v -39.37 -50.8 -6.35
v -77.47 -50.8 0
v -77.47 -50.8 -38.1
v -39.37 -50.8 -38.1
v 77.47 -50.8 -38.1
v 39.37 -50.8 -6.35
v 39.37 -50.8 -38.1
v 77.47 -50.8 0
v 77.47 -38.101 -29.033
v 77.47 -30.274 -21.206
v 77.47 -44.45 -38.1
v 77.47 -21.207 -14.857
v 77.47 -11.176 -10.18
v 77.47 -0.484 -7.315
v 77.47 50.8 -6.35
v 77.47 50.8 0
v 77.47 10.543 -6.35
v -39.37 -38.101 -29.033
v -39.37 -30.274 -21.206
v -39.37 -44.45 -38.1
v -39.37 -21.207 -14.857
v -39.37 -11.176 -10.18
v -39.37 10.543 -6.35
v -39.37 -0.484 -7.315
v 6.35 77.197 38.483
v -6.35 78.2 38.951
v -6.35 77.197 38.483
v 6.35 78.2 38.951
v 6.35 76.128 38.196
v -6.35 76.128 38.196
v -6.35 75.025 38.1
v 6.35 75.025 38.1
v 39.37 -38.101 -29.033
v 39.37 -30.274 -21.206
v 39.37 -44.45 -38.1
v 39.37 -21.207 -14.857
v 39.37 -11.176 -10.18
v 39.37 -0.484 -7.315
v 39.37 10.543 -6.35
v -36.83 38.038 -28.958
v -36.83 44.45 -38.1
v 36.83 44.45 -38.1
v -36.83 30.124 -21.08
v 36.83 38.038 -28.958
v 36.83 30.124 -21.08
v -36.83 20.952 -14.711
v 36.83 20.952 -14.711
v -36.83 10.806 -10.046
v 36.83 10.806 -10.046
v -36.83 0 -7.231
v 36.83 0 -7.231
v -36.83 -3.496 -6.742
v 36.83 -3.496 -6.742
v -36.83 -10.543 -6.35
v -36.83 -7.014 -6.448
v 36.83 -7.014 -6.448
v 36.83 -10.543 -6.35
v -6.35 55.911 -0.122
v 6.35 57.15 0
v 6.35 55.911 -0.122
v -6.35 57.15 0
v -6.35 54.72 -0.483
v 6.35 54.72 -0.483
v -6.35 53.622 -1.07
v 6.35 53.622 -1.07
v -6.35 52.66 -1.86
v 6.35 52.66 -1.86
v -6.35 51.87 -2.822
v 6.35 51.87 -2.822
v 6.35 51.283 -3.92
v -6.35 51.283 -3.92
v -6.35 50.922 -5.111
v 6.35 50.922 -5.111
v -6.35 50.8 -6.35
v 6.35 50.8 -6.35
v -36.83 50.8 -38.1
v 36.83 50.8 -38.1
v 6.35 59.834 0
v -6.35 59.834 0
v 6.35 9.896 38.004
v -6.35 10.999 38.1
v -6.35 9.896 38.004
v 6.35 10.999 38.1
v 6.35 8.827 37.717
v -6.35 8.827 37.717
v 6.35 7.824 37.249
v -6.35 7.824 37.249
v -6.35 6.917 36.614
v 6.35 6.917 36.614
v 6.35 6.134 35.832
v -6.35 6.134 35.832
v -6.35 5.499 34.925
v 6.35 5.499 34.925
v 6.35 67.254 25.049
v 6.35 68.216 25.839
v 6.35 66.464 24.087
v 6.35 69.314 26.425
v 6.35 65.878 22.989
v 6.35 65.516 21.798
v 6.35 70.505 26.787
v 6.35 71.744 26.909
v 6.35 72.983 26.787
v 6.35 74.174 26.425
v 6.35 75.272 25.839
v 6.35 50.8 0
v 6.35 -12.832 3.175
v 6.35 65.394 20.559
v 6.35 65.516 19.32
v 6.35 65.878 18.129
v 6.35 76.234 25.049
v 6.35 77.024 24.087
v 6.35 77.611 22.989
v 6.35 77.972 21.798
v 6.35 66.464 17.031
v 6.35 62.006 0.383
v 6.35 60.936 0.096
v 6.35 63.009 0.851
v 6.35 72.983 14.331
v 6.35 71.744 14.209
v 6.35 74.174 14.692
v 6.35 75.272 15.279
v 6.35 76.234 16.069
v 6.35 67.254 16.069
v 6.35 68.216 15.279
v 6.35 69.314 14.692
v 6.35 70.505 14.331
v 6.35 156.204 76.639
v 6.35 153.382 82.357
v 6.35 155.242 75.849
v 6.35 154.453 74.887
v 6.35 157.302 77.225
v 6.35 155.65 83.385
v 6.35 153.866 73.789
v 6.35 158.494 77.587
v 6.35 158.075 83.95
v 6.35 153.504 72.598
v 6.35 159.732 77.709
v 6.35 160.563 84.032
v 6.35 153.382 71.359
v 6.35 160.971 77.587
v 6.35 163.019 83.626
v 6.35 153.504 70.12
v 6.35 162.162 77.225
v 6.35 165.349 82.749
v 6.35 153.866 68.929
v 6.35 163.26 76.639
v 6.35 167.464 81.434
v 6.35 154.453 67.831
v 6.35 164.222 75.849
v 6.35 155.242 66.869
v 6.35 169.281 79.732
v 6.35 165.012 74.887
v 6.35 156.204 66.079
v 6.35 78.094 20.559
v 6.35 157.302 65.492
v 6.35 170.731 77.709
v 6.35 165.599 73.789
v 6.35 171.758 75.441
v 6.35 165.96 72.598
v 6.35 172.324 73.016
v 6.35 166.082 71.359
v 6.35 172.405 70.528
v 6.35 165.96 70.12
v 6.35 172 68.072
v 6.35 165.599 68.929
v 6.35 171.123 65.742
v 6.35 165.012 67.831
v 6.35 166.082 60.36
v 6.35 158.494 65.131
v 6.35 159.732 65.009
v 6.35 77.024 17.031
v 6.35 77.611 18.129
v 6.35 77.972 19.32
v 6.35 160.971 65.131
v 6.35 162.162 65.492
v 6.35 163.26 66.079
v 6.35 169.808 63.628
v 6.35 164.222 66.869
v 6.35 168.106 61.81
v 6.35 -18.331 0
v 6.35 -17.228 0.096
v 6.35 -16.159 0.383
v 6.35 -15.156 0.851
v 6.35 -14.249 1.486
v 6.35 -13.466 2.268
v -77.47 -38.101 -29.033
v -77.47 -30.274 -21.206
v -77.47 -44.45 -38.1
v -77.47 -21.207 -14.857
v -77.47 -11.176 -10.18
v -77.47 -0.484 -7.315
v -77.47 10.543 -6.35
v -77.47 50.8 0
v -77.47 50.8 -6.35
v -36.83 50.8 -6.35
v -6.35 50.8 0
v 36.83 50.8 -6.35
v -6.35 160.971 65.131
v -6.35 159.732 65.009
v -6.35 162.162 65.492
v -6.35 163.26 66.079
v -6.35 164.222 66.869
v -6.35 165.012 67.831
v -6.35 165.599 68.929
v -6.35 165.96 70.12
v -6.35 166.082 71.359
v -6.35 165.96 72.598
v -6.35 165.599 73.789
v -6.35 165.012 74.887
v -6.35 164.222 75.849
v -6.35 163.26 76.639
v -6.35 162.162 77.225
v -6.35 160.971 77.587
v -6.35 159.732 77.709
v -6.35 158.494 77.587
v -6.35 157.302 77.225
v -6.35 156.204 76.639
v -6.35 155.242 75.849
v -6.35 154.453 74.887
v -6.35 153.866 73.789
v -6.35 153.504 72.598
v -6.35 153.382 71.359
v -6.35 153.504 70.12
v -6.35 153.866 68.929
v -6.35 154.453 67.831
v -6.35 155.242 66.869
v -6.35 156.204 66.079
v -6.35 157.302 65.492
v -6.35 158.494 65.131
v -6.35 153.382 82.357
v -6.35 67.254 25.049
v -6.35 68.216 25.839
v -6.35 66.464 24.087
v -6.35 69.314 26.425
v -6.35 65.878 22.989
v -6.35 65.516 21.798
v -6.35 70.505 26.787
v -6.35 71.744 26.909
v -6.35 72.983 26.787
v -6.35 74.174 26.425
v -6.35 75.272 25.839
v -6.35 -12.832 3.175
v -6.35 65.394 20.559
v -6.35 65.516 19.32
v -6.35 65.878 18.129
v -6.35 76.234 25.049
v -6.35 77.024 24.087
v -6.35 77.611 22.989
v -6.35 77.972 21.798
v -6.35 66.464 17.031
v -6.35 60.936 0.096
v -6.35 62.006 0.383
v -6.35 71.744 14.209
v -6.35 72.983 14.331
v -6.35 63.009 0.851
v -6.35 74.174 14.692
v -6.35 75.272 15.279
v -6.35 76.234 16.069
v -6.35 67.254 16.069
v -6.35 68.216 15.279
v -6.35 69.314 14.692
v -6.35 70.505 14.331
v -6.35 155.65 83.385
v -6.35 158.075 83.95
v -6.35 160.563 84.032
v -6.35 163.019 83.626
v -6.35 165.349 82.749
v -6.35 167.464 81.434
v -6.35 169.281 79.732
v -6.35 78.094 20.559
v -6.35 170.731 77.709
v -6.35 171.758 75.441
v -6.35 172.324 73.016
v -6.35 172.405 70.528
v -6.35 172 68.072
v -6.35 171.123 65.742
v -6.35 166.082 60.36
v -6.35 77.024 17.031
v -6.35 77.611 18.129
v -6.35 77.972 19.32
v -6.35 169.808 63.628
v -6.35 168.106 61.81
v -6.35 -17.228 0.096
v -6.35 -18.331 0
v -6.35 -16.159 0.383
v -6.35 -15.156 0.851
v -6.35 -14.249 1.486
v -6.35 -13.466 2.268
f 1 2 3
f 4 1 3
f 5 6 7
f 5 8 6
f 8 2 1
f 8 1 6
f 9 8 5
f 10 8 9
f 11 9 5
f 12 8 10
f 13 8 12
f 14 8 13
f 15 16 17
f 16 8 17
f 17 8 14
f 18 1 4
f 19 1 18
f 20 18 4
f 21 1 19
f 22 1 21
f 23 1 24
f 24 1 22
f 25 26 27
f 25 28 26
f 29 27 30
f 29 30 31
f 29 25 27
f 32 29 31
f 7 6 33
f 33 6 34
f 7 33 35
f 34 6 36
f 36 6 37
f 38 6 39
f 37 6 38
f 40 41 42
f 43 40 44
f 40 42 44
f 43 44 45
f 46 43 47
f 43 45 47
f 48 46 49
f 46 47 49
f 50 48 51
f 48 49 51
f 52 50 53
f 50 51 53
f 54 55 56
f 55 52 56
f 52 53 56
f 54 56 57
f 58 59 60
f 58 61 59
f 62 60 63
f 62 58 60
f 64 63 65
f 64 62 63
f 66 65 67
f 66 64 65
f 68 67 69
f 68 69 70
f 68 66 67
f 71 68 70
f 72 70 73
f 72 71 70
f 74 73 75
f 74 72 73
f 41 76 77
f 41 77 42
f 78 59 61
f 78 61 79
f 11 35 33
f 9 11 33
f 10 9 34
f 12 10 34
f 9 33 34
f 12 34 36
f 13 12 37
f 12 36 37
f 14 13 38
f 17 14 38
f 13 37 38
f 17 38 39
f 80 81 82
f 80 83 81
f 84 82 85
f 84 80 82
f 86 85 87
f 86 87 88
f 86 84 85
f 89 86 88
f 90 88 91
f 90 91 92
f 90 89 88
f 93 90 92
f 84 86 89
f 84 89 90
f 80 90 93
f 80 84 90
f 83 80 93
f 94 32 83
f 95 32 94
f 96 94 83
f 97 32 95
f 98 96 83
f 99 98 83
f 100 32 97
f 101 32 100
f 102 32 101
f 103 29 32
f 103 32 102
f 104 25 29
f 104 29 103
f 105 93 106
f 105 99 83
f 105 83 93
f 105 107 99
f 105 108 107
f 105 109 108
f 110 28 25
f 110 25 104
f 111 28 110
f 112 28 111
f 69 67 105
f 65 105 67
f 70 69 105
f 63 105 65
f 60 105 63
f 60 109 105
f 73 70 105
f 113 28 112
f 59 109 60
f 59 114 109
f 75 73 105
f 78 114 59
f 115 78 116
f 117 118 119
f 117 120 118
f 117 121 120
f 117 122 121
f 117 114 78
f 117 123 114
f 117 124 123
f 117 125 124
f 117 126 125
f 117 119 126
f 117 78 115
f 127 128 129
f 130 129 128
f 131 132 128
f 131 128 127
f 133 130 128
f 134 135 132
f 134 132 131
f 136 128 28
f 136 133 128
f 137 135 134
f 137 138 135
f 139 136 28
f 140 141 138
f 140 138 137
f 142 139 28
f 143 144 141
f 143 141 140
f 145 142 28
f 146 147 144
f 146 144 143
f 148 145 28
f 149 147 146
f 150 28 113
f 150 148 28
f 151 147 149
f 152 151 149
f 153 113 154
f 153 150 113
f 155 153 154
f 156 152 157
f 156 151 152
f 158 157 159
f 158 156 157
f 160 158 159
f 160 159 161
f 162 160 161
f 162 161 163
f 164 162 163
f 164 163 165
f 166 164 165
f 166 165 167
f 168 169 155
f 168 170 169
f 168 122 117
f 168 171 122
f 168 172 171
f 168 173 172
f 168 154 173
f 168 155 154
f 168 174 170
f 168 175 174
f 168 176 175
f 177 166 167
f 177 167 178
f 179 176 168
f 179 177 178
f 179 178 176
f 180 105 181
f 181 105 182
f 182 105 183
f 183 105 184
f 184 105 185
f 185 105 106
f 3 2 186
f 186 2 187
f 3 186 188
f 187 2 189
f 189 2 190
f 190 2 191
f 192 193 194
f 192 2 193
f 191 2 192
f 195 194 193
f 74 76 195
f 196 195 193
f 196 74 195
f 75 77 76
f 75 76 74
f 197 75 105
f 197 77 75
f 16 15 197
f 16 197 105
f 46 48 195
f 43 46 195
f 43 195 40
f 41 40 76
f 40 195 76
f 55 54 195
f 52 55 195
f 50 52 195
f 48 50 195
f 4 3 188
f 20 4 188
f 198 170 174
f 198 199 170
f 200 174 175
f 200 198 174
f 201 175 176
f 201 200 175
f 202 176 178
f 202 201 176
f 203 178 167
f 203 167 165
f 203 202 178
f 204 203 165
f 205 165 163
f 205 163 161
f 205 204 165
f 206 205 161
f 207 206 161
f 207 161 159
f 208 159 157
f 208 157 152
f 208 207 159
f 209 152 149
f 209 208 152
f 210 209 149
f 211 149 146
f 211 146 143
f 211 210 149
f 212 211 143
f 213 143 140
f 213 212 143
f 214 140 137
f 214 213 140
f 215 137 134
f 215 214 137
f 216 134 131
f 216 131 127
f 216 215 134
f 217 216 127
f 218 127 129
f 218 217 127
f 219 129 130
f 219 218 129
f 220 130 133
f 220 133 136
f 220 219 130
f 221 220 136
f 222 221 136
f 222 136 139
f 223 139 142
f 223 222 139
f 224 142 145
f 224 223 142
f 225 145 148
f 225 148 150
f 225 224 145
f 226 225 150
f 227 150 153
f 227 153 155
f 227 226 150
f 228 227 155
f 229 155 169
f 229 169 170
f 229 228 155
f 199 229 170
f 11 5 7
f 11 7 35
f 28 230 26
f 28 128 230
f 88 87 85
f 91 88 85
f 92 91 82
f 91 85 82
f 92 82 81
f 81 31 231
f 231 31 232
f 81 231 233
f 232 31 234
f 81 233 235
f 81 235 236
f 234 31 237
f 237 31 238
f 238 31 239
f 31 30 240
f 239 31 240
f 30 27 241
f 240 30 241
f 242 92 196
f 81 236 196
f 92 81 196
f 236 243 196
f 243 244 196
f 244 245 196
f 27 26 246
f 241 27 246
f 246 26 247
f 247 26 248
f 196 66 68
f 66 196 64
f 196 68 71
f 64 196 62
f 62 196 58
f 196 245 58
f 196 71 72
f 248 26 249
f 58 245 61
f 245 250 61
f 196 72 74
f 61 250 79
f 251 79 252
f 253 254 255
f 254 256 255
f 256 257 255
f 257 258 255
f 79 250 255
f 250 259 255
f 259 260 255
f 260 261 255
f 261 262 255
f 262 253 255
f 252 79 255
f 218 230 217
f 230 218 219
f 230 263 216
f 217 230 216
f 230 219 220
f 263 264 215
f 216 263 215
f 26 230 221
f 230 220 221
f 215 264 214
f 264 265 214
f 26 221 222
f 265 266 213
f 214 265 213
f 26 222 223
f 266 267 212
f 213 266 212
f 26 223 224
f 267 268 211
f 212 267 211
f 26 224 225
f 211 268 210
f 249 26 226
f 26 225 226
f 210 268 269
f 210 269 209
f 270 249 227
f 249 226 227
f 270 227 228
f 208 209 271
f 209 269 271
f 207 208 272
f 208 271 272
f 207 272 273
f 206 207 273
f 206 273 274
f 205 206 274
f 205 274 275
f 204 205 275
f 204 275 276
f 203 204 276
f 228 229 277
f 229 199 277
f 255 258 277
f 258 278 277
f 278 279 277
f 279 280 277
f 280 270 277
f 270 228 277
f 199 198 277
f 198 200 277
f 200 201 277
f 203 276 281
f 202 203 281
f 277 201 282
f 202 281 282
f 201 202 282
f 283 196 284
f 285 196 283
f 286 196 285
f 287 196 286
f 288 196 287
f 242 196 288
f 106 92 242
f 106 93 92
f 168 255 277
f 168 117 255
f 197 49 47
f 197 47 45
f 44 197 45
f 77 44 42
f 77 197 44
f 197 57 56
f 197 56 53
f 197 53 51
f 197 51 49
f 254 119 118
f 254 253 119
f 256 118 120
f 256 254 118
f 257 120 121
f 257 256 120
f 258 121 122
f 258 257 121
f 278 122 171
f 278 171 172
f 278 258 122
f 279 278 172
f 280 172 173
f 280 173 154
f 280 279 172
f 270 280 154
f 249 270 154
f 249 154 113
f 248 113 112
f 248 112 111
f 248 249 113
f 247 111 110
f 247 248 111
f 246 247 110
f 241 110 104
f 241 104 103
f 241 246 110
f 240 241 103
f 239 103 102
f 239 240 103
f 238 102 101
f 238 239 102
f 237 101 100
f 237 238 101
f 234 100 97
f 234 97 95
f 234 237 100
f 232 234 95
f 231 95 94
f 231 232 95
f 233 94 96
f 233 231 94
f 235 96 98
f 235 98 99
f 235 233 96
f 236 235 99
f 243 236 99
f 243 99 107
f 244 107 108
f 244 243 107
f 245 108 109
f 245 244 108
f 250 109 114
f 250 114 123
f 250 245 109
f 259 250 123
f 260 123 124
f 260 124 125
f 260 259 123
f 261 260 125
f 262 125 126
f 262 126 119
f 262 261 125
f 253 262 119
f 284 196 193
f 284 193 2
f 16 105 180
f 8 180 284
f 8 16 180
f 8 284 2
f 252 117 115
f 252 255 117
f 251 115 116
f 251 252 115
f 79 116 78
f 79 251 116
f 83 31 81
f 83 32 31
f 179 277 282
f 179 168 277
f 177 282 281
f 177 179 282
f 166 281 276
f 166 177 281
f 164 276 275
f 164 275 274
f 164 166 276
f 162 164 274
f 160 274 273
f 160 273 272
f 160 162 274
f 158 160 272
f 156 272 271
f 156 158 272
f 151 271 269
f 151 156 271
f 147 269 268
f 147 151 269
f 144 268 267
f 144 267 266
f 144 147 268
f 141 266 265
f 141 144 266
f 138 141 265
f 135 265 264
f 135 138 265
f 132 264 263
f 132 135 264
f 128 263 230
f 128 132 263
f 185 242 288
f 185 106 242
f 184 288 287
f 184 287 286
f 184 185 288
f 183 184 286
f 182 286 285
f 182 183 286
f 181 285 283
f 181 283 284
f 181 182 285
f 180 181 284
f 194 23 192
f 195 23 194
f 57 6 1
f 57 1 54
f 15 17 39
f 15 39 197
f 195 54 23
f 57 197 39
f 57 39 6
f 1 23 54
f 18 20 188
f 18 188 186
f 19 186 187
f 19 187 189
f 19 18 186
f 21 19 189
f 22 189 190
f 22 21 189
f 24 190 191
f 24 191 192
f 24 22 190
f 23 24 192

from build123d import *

# Parameters (mm, degrees)
BOSS_EXTRUDE1_DEPTH = 76.2
CUT_EXTRUDE1_START  = 38.1
CUT_EXTRUDE1_DEPTH  = 38.1
BOSS_EXTRUDE5_DEPTH = 38.1
SKETCH5_R           = 6.35
BOSS_EXTRUDE6_DEPTH = 6.35
FILLET1_R           = 6.35
CUT_EXTRUDE3_DEPTH  = 2.54


with BuildPart() as part:
    # Sketch1 → Boss-Extrude1 (new, symmetric)
    with BuildSketch(Plane(origin=(0, 0, 0), x_dir=(0, 0, -1), z_dir=(1, 0, 0))):
        with BuildLine():
            Line((0, 50.8), (38.1, 50.8))
            Line((38.1, 50.8), (38.1, 44.45))
            ThreePointArc((38.1, 44.45), (14.85738686, 21.20738686), (6.35, -10.54261314))
            Line((6.35, -10.54261314), (6.35, -50.8))
            Line((6.35, -50.8), (0, -50.8))
            Line((0, -50.8), (0, 50.8))
        make_face()
    extrude(amount=BOSS_EXTRUDE1_DEPTH, both=True)

    # Sketch6 → Cut-Extrude1 (cut)
    with BuildSketch(Plane(origin=(39.37, 0, 0), x_dir=(0, 0, -1), z_dir=(1, 0, 0)).offset(CUT_EXTRUDE1_START)):
        with BuildLine():
            Line((0, -50.8), (6.35, -50.8))
            Line((6.35, -50.8), (6.35, -10.54261314))
            ThreePointArc((6.35, -10.54261314), (14.85738686, 21.20738686), (38.1, 44.45))
            Line((38.1, 44.45), (38.1, 50.8))
            Line((38.1, 50.8), (0, 50.8))
            Line((0, 50.8), (0, -50.8))
        make_face()
    cut_extrude1 = extrude(amount=-CUT_EXTRUDE1_DEPTH, mode=Mode.SUBTRACT)

    # Mirror1: Cut-Extrude1 across plane
    add(cut_extrude1.mirror(Plane(origin=(0, 0, 0), x_dir=(0, 0, 1), z_dir=(1, 0, 0))), mode=Mode.SUBTRACT)

    # Sketch7 → Boss-Extrude5 (add)
    with BuildSketch(Plane(origin=(39.37, 0, 0), x_dir=(0, 0, -1), z_dir=(1, 0, 0))):
        with BuildLine():
            Line((0, 50.8), (0, -50.8))
            Line((0, -50.8), (38.1, -50.8))
            Line((38.1, -50.8), (38.1, -44.45))
            ThreePointArc((38.1, -44.45), (14.85738686, -21.20738686), (6.35, 10.54261314))
            Line((6.35, 10.54261314), (6.35, 50.8))
            Line((6.35, 50.8), (0, 50.8))
        make_face()
    boss_extrude5 = extrude(amount=BOSS_EXTRUDE5_DEPTH)

    # Mirror2: Boss-Extrude5 across plane
    add(boss_extrude5.mirror(Plane(origin=(0, 0, 0), x_dir=(0, 0, 1), z_dir=(1, 0, 0))))

    # Sketch5 → Boss-Extrude6 (add, symmetric)
    with BuildSketch(Plane(origin=(0, 0, 0), x_dir=(0, 0, -1), z_dir=(1, 0, 0))):
        with BuildLine():
            Line((-82.357309978, 153.382348419), (-38.1, 76.726438931))
            Line((-38.1, 76.726438931), (-38.1, 7.332348419))
            Line((-38.1, 7.332348419), (0, -14.664696837))
            Line((0, -14.664696837), (0, 14.664696837))
            Line((0, 14.664696837), (0, 61.535303163))
            Line((0, 61.535303163), (-60.360264722, 166.082348419))
            ThreePointArc((-60.360264722, 166.082348419), (-77.70878735, 170.730871047), (-82.357309978, 153.382348419))
        make_face()
        with Locations((-71.35878735, 159.732348419)):
            Circle(SKETCH5_R, mode=Mode.SUBTRACT)
        with Locations((-20.55878735, 71.744167394)):
            Circle(SKETCH5_R, mode=Mode.SUBTRACT)
    extrude(amount=BOSS_EXTRUDE6_DEPTH, both=True)

    # Fillet1
    fillet1_edges = [part.edges().sort_by_distance(p)[0] for p in [
        (0, 50.8, 0),
        (0, 61.535303163, 0),
        (0, -14.664696837, 0),
        (0, 7.332348419, 38.1),
        (0, 76.726438931, 38.1),
    ]]
    fillet(fillet1_edges, radius=FILLET1_R)

    # Sketch9 → Cut-Extrude3 (cut)
    with BuildSketch(Plane(origin=(39.37, 0, 0), x_dir=(0, 0, -1), z_dir=(1, 0, 0))):
        with BuildLine():
            Line((38.1, 50.8), (6.35, 50.8))
            Line((6.35, 50.8), (6.35, -10.54261314))
            ThreePointArc((6.35, -10.54261314), (6.570705119, -5.252921341), (7.231286278, 0))
            ThreePointArc((7.231286278, 0), (17.693368999, 25.678041777), (38.1, 44.45))
            Line((38.1, 44.45), (38.1, 50.8))
        make_face()
    cut_extrude3 = extrude(amount=-CUT_EXTRUDE3_DEPTH, mode=Mode.SUBTRACT)

    # Mirror5: Cut-Extrude3 across plane
    add(cut_extrude3.mirror(Plane(origin=(0, 0, 0), x_dir=(0, 0, 1), z_dir=(1, 0, 0))), mode=Mode.SUBTRACT)


solid = part.part
